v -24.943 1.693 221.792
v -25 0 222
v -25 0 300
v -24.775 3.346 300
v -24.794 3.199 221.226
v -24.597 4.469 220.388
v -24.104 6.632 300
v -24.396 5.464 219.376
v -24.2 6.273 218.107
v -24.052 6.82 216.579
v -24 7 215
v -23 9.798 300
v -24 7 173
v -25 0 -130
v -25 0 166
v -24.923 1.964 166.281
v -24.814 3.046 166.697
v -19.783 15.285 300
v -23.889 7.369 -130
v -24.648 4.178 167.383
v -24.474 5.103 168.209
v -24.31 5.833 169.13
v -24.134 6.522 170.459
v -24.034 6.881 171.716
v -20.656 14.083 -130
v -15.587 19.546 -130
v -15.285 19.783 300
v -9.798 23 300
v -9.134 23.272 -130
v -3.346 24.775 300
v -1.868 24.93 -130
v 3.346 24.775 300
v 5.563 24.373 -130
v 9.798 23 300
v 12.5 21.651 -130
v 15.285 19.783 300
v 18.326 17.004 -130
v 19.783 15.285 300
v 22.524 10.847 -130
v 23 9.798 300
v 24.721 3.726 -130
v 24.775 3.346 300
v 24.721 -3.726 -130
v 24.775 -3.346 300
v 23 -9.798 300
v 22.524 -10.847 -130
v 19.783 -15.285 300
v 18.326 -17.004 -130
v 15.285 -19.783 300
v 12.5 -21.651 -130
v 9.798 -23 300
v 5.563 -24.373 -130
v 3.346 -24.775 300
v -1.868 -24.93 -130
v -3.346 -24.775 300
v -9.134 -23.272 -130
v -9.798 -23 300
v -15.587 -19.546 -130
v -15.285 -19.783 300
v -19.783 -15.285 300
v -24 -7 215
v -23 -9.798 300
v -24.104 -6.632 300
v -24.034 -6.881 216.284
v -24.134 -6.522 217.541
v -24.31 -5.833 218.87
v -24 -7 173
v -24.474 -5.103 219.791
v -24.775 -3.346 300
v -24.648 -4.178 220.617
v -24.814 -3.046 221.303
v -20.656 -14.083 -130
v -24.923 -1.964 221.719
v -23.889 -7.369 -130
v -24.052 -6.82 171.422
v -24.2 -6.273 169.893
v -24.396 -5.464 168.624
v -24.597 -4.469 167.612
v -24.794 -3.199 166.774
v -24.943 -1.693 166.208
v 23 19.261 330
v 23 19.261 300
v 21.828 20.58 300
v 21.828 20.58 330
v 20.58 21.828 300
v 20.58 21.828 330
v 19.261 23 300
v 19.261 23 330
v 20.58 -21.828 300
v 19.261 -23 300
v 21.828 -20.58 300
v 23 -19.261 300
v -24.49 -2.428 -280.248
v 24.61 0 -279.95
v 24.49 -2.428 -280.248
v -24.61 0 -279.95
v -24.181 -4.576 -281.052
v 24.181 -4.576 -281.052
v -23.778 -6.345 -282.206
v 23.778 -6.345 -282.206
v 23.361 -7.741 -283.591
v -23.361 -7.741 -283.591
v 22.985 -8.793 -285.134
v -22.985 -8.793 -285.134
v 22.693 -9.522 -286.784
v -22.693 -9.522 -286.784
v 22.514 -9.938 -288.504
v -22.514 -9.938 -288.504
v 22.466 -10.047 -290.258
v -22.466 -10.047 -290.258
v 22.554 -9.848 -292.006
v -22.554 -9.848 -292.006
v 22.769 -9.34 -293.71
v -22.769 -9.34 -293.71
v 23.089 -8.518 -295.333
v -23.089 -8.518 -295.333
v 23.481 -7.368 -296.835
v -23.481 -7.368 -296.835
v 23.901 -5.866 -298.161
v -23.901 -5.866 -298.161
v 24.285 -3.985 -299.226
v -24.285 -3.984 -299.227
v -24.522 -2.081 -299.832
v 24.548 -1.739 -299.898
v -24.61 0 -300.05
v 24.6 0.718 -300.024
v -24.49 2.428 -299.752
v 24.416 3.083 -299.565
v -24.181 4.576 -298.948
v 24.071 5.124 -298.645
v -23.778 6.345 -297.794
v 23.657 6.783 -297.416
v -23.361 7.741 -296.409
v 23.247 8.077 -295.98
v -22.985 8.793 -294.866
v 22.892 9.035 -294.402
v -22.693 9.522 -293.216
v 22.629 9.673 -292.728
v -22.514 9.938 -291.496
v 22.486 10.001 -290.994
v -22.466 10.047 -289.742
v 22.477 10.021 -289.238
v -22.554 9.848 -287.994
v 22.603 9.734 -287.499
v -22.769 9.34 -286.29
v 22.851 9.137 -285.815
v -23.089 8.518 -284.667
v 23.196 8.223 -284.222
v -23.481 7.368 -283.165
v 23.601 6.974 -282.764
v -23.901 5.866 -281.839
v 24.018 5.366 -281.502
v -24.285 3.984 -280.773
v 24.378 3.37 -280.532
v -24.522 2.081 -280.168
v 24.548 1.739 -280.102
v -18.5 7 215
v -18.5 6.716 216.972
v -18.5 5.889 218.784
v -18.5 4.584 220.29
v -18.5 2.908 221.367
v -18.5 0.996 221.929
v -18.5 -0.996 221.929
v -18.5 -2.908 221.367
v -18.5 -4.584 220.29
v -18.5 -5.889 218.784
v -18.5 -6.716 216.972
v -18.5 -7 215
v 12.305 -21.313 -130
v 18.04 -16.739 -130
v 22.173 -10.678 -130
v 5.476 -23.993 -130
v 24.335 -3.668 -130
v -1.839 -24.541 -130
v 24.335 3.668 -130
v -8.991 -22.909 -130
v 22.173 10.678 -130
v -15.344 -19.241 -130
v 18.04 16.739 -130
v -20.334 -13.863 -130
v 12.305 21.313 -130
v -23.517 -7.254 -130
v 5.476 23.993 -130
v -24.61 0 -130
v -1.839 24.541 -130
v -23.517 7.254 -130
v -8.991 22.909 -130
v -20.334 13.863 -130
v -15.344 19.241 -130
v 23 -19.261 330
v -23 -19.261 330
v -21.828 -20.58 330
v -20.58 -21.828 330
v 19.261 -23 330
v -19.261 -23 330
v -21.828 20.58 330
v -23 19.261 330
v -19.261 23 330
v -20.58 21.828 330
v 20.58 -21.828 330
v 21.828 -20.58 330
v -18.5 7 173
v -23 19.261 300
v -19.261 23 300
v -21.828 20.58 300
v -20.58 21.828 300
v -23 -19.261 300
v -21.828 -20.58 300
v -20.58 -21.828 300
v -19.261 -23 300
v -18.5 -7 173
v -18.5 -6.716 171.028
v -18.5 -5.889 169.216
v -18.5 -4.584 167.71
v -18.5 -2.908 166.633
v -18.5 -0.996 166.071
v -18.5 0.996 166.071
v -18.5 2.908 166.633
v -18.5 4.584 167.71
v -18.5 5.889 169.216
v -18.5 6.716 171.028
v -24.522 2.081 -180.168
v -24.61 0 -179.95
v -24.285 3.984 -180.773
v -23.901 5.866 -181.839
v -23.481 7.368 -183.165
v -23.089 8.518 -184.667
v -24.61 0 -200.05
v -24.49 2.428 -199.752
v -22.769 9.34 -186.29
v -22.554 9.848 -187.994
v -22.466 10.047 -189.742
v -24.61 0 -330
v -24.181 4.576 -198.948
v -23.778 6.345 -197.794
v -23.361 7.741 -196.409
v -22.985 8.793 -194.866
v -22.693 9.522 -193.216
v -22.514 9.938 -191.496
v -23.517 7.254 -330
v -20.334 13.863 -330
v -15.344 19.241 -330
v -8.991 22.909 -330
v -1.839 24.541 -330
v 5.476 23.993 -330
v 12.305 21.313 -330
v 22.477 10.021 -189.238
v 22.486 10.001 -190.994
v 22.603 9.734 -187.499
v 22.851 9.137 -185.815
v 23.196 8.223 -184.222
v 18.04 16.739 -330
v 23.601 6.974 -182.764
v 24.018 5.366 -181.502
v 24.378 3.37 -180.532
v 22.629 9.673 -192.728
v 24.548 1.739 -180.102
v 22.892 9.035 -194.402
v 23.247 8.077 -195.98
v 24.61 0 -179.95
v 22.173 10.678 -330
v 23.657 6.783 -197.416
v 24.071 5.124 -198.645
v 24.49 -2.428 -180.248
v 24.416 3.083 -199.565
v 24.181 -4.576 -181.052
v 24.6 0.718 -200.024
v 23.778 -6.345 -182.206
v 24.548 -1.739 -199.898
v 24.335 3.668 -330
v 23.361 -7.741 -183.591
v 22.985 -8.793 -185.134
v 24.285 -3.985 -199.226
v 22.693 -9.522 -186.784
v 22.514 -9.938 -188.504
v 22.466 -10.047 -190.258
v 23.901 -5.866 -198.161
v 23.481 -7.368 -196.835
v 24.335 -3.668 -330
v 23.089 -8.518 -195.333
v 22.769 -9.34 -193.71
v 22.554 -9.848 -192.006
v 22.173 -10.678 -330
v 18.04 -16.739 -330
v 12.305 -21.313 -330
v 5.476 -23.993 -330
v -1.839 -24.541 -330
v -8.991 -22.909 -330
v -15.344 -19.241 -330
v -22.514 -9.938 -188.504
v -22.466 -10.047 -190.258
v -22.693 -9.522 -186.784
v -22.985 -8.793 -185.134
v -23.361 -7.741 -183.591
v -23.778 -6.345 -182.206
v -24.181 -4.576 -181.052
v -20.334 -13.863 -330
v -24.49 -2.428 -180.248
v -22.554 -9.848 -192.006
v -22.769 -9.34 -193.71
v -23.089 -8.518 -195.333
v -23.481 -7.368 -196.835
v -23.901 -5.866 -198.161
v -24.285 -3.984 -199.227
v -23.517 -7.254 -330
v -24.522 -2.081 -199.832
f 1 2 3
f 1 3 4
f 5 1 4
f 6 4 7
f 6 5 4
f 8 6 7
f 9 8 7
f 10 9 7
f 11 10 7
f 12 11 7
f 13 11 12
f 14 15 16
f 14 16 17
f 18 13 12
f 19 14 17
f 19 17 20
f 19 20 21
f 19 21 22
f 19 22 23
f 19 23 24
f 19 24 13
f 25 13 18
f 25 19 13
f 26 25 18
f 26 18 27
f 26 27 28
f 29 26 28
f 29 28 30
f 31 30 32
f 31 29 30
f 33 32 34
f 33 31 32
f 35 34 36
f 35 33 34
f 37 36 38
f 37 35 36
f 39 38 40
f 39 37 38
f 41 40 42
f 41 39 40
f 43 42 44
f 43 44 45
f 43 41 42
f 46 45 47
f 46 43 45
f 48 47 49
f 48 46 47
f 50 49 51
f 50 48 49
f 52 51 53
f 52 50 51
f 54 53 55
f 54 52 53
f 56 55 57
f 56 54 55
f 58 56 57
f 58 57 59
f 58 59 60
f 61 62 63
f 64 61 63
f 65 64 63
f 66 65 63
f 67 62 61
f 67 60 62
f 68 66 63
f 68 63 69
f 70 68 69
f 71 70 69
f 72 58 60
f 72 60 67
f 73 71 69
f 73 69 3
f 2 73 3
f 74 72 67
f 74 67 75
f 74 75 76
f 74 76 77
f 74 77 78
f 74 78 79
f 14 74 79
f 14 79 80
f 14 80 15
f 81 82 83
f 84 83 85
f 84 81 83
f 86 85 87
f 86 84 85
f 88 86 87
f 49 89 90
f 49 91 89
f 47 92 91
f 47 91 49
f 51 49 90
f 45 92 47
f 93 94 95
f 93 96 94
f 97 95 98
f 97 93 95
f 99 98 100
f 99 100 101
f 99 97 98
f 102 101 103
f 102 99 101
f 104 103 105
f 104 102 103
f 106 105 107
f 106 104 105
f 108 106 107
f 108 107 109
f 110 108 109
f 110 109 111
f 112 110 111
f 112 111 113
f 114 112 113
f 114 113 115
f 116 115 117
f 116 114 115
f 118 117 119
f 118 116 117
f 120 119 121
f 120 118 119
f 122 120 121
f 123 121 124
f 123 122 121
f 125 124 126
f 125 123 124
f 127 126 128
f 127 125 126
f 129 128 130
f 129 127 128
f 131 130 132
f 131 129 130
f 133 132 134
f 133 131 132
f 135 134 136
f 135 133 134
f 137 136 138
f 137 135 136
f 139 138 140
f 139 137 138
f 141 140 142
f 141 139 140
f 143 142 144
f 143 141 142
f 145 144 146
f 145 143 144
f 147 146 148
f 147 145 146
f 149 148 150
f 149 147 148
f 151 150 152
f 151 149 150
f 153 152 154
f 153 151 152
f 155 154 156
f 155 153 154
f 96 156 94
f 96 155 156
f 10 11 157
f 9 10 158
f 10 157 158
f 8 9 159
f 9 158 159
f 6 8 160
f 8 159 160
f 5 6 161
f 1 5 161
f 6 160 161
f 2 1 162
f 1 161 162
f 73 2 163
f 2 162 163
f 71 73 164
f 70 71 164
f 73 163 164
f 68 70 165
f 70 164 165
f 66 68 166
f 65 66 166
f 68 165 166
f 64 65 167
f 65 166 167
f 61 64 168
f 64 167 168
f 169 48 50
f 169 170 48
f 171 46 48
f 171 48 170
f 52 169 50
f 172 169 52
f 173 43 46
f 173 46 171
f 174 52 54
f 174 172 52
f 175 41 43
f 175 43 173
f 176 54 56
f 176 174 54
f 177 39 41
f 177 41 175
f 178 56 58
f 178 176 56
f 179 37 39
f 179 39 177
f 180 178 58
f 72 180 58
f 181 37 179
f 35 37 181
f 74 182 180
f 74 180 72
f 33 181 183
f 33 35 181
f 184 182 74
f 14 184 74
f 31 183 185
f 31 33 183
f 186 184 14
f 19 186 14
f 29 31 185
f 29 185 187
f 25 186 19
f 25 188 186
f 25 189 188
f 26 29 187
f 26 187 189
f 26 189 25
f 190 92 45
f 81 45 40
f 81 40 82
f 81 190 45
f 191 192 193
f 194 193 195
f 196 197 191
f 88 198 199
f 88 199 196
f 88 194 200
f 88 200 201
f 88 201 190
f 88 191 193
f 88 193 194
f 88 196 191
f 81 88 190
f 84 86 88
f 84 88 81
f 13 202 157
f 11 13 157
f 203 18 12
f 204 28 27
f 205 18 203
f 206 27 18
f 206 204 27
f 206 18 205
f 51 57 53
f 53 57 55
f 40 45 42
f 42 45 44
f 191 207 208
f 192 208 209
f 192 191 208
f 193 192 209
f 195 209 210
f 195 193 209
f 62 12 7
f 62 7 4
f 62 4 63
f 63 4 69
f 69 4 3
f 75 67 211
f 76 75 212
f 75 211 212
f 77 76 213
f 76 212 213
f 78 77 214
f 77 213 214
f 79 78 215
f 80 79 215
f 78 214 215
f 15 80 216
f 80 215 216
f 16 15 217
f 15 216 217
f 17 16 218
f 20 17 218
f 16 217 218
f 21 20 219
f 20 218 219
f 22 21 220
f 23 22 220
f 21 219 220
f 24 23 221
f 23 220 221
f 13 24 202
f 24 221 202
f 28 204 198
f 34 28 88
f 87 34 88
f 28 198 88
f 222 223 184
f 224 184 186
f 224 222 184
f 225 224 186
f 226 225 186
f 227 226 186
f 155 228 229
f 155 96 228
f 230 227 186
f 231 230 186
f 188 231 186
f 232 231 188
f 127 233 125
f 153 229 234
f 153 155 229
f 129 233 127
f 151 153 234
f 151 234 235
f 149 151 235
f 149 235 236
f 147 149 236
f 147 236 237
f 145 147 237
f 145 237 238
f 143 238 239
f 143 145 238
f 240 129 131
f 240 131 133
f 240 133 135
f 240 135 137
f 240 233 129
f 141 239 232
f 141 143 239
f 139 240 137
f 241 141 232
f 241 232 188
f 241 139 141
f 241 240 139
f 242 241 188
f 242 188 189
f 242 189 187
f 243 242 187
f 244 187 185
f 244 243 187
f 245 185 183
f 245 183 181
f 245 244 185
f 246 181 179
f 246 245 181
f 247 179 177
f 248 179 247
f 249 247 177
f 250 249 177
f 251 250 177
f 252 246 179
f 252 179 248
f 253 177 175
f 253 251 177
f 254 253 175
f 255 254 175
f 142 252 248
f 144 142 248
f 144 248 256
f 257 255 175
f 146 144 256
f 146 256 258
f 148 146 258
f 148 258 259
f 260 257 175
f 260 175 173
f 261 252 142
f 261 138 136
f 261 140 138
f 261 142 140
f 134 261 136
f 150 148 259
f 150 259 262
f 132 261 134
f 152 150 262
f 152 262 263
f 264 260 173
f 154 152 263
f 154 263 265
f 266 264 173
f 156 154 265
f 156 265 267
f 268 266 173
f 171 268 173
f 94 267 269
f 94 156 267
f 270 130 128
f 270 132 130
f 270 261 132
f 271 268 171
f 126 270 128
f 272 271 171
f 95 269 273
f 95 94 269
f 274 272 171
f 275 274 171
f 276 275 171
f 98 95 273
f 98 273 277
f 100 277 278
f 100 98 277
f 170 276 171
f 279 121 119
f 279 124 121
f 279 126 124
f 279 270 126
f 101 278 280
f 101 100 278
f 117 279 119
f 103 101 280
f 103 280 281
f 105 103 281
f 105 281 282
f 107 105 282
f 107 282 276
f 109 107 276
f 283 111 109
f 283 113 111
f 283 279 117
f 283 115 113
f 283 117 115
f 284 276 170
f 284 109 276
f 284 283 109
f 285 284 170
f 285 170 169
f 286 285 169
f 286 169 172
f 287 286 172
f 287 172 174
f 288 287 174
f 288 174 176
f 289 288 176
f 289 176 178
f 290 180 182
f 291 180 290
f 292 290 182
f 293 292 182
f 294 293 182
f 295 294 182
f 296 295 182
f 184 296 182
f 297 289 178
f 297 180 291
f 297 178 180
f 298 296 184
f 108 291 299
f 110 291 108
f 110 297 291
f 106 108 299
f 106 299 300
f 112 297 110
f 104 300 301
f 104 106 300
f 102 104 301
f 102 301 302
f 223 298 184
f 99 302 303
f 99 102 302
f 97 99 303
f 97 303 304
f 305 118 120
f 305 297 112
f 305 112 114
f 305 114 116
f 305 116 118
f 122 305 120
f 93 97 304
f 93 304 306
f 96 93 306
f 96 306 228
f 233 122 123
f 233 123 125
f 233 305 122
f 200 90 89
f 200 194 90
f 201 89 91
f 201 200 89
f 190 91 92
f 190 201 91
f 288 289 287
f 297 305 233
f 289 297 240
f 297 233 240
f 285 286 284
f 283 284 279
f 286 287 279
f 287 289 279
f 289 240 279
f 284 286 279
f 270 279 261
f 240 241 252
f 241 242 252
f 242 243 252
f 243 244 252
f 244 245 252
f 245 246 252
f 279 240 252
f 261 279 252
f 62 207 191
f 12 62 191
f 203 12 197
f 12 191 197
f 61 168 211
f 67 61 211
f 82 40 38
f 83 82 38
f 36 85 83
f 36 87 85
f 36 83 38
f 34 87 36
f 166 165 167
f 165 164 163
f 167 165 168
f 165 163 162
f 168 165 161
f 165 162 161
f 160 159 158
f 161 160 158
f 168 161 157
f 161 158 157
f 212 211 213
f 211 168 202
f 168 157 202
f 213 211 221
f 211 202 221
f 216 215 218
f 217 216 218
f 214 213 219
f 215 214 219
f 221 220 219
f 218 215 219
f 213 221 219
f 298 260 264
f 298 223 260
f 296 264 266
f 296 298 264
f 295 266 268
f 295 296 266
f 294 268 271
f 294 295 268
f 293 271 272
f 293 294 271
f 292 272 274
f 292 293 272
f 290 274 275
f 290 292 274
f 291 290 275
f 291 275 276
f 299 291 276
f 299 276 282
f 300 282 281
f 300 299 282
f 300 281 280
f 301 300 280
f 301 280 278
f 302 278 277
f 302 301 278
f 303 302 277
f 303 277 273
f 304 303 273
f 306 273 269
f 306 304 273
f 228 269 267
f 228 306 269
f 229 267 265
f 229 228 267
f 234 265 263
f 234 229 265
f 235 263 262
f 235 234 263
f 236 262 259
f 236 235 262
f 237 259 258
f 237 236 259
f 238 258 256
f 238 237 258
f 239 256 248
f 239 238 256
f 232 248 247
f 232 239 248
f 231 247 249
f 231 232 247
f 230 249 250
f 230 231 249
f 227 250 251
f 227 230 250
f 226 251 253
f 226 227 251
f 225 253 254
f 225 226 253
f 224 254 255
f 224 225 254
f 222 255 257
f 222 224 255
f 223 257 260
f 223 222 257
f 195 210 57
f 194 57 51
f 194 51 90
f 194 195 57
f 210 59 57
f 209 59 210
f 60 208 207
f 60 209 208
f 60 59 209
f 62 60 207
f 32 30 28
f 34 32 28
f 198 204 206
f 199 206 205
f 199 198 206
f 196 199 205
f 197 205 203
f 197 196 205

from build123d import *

# Parameters (mm, degrees)
SKETCH1_R               = 30
BOSS_EXTRUDE1_DEPTH     = 330
CUT_EXTRUDE1_DEPTH      = 333.716095192
CUT_EXTRUDE1_DEPTH_BACK = 333.716095192
SKETCH2_R               = 10.05
CUT_EXTRUDE2_DEPTH      = 335.89140043
SKETCH4_OUTSIDE_W       = 195.086
SKETCH4_OUTSIDE_H       = 195.086
SKETCH4_OUTSIDE_W_2     = 46
SKETCH4_OUTSIDE_H_2     = 46
CUT_EXTRUDE3_DEPTH      = 30
SKETCH5_OUTSIDE_W       = 195.086
SKETCH5_OUTSIDE_H       = 195.086
SKETCH5_OUTSIDE_R       = 24.61
CUT_EXTRUDE4_DEPTH      = 200
SKETCH6_OUTSIDE_W       = 195.086
SKETCH6_OUTSIDE_H       = 195.086
SKETCH6_OUTSIDE_R       = 25
CUT_EXTRUDE5_DEPTH      = 430


with BuildPart() as part:
    # Sketch1 → Boss-Extrude1 (new, symmetric)
    with BuildSketch(Plane.XY):
        Circle(SKETCH1_R)
    extrude(amount=BOSS_EXTRUDE1_DEPTH, both=True)

    # Sketch2 → Cut-Extrude1 (cut, two sides: drawn at the far end of the back side and taken through both)
    with BuildSketch(Plane(origin=(0, 0, 0), x_dir=(0, 0, -1), z_dir=(1, 0, 0)).offset(-CUT_EXTRUDE1_DEPTH_BACK)):
        with Locations(Location((190, 0, 0), (0, 0, 180))):
            Circle(SKETCH2_R)
        with Locations(Location((290, 0, 0), (0, 0, 180))):
            Circle(SKETCH2_R)
    extrude(amount=CUT_EXTRUDE1_DEPTH + CUT_EXTRUDE1_DEPTH_BACK, mode=Mode.SUBTRACT)

    # Sketch3 → Cut-Extrude2 (cut, through all)
    with BuildSketch(Plane(origin=(-18.5, 0, 0), x_dir=(0, 0, -1), z_dir=(1, 0, 0))):
        with BuildLine():
            Line((-215, -7), (-173, -7))
            ThreePointArc((-173, -7), (-166, 0), (-173, 7))
            Line((-173, 7), (-215, 7))
            ThreePointArc((-215, 7), (-222, 0), (-215, -7))
        make_face()
    extrude(amount=-CUT_EXTRUDE2_DEPTH, mode=Mode.SUBTRACT)

    # Sketch4 outside → Cut-Extrude3 (cut)
    with BuildSketch(Plane.XY.offset(330)):
        Rectangle(SKETCH4_OUTSIDE_W, SKETCH4_OUTSIDE_H)
        Rectangle(SKETCH4_OUTSIDE_W_2, SKETCH4_OUTSIDE_H_2, mode=Mode.SUBTRACT)
    extrude(amount=-CUT_EXTRUDE3_DEPTH, mode=Mode.SUBTRACT)

    # Sketch5 outside → Cut-Extrude4 (cut)
    with BuildSketch(Plane(origin=(0, 0, -330), x_dir=(-1, 0, 0), z_dir=(0, 0, -1))):
        Rectangle(SKETCH5_OUTSIDE_W, SKETCH5_OUTSIDE_H)
        Circle(SKETCH5_OUTSIDE_R, mode=Mode.SUBTRACT)
    extrude(amount=-CUT_EXTRUDE4_DEPTH, mode=Mode.SUBTRACT)

    # Sketch6 outside → Cut-Extrude5 (cut)
    with BuildSketch(Plane(origin=(0, 0, -130), x_dir=(-1, 0, 0), z_dir=(0, 0, -1))):
        Rectangle(SKETCH6_OUTSIDE_W, SKETCH6_OUTSIDE_H)
        Circle(SKETCH6_OUTSIDE_R, mode=Mode.SUBTRACT)
    extrude(amount=-CUT_EXTRUDE5_DEPTH, mode=Mode.SUBTRACT)


solid = part.part
